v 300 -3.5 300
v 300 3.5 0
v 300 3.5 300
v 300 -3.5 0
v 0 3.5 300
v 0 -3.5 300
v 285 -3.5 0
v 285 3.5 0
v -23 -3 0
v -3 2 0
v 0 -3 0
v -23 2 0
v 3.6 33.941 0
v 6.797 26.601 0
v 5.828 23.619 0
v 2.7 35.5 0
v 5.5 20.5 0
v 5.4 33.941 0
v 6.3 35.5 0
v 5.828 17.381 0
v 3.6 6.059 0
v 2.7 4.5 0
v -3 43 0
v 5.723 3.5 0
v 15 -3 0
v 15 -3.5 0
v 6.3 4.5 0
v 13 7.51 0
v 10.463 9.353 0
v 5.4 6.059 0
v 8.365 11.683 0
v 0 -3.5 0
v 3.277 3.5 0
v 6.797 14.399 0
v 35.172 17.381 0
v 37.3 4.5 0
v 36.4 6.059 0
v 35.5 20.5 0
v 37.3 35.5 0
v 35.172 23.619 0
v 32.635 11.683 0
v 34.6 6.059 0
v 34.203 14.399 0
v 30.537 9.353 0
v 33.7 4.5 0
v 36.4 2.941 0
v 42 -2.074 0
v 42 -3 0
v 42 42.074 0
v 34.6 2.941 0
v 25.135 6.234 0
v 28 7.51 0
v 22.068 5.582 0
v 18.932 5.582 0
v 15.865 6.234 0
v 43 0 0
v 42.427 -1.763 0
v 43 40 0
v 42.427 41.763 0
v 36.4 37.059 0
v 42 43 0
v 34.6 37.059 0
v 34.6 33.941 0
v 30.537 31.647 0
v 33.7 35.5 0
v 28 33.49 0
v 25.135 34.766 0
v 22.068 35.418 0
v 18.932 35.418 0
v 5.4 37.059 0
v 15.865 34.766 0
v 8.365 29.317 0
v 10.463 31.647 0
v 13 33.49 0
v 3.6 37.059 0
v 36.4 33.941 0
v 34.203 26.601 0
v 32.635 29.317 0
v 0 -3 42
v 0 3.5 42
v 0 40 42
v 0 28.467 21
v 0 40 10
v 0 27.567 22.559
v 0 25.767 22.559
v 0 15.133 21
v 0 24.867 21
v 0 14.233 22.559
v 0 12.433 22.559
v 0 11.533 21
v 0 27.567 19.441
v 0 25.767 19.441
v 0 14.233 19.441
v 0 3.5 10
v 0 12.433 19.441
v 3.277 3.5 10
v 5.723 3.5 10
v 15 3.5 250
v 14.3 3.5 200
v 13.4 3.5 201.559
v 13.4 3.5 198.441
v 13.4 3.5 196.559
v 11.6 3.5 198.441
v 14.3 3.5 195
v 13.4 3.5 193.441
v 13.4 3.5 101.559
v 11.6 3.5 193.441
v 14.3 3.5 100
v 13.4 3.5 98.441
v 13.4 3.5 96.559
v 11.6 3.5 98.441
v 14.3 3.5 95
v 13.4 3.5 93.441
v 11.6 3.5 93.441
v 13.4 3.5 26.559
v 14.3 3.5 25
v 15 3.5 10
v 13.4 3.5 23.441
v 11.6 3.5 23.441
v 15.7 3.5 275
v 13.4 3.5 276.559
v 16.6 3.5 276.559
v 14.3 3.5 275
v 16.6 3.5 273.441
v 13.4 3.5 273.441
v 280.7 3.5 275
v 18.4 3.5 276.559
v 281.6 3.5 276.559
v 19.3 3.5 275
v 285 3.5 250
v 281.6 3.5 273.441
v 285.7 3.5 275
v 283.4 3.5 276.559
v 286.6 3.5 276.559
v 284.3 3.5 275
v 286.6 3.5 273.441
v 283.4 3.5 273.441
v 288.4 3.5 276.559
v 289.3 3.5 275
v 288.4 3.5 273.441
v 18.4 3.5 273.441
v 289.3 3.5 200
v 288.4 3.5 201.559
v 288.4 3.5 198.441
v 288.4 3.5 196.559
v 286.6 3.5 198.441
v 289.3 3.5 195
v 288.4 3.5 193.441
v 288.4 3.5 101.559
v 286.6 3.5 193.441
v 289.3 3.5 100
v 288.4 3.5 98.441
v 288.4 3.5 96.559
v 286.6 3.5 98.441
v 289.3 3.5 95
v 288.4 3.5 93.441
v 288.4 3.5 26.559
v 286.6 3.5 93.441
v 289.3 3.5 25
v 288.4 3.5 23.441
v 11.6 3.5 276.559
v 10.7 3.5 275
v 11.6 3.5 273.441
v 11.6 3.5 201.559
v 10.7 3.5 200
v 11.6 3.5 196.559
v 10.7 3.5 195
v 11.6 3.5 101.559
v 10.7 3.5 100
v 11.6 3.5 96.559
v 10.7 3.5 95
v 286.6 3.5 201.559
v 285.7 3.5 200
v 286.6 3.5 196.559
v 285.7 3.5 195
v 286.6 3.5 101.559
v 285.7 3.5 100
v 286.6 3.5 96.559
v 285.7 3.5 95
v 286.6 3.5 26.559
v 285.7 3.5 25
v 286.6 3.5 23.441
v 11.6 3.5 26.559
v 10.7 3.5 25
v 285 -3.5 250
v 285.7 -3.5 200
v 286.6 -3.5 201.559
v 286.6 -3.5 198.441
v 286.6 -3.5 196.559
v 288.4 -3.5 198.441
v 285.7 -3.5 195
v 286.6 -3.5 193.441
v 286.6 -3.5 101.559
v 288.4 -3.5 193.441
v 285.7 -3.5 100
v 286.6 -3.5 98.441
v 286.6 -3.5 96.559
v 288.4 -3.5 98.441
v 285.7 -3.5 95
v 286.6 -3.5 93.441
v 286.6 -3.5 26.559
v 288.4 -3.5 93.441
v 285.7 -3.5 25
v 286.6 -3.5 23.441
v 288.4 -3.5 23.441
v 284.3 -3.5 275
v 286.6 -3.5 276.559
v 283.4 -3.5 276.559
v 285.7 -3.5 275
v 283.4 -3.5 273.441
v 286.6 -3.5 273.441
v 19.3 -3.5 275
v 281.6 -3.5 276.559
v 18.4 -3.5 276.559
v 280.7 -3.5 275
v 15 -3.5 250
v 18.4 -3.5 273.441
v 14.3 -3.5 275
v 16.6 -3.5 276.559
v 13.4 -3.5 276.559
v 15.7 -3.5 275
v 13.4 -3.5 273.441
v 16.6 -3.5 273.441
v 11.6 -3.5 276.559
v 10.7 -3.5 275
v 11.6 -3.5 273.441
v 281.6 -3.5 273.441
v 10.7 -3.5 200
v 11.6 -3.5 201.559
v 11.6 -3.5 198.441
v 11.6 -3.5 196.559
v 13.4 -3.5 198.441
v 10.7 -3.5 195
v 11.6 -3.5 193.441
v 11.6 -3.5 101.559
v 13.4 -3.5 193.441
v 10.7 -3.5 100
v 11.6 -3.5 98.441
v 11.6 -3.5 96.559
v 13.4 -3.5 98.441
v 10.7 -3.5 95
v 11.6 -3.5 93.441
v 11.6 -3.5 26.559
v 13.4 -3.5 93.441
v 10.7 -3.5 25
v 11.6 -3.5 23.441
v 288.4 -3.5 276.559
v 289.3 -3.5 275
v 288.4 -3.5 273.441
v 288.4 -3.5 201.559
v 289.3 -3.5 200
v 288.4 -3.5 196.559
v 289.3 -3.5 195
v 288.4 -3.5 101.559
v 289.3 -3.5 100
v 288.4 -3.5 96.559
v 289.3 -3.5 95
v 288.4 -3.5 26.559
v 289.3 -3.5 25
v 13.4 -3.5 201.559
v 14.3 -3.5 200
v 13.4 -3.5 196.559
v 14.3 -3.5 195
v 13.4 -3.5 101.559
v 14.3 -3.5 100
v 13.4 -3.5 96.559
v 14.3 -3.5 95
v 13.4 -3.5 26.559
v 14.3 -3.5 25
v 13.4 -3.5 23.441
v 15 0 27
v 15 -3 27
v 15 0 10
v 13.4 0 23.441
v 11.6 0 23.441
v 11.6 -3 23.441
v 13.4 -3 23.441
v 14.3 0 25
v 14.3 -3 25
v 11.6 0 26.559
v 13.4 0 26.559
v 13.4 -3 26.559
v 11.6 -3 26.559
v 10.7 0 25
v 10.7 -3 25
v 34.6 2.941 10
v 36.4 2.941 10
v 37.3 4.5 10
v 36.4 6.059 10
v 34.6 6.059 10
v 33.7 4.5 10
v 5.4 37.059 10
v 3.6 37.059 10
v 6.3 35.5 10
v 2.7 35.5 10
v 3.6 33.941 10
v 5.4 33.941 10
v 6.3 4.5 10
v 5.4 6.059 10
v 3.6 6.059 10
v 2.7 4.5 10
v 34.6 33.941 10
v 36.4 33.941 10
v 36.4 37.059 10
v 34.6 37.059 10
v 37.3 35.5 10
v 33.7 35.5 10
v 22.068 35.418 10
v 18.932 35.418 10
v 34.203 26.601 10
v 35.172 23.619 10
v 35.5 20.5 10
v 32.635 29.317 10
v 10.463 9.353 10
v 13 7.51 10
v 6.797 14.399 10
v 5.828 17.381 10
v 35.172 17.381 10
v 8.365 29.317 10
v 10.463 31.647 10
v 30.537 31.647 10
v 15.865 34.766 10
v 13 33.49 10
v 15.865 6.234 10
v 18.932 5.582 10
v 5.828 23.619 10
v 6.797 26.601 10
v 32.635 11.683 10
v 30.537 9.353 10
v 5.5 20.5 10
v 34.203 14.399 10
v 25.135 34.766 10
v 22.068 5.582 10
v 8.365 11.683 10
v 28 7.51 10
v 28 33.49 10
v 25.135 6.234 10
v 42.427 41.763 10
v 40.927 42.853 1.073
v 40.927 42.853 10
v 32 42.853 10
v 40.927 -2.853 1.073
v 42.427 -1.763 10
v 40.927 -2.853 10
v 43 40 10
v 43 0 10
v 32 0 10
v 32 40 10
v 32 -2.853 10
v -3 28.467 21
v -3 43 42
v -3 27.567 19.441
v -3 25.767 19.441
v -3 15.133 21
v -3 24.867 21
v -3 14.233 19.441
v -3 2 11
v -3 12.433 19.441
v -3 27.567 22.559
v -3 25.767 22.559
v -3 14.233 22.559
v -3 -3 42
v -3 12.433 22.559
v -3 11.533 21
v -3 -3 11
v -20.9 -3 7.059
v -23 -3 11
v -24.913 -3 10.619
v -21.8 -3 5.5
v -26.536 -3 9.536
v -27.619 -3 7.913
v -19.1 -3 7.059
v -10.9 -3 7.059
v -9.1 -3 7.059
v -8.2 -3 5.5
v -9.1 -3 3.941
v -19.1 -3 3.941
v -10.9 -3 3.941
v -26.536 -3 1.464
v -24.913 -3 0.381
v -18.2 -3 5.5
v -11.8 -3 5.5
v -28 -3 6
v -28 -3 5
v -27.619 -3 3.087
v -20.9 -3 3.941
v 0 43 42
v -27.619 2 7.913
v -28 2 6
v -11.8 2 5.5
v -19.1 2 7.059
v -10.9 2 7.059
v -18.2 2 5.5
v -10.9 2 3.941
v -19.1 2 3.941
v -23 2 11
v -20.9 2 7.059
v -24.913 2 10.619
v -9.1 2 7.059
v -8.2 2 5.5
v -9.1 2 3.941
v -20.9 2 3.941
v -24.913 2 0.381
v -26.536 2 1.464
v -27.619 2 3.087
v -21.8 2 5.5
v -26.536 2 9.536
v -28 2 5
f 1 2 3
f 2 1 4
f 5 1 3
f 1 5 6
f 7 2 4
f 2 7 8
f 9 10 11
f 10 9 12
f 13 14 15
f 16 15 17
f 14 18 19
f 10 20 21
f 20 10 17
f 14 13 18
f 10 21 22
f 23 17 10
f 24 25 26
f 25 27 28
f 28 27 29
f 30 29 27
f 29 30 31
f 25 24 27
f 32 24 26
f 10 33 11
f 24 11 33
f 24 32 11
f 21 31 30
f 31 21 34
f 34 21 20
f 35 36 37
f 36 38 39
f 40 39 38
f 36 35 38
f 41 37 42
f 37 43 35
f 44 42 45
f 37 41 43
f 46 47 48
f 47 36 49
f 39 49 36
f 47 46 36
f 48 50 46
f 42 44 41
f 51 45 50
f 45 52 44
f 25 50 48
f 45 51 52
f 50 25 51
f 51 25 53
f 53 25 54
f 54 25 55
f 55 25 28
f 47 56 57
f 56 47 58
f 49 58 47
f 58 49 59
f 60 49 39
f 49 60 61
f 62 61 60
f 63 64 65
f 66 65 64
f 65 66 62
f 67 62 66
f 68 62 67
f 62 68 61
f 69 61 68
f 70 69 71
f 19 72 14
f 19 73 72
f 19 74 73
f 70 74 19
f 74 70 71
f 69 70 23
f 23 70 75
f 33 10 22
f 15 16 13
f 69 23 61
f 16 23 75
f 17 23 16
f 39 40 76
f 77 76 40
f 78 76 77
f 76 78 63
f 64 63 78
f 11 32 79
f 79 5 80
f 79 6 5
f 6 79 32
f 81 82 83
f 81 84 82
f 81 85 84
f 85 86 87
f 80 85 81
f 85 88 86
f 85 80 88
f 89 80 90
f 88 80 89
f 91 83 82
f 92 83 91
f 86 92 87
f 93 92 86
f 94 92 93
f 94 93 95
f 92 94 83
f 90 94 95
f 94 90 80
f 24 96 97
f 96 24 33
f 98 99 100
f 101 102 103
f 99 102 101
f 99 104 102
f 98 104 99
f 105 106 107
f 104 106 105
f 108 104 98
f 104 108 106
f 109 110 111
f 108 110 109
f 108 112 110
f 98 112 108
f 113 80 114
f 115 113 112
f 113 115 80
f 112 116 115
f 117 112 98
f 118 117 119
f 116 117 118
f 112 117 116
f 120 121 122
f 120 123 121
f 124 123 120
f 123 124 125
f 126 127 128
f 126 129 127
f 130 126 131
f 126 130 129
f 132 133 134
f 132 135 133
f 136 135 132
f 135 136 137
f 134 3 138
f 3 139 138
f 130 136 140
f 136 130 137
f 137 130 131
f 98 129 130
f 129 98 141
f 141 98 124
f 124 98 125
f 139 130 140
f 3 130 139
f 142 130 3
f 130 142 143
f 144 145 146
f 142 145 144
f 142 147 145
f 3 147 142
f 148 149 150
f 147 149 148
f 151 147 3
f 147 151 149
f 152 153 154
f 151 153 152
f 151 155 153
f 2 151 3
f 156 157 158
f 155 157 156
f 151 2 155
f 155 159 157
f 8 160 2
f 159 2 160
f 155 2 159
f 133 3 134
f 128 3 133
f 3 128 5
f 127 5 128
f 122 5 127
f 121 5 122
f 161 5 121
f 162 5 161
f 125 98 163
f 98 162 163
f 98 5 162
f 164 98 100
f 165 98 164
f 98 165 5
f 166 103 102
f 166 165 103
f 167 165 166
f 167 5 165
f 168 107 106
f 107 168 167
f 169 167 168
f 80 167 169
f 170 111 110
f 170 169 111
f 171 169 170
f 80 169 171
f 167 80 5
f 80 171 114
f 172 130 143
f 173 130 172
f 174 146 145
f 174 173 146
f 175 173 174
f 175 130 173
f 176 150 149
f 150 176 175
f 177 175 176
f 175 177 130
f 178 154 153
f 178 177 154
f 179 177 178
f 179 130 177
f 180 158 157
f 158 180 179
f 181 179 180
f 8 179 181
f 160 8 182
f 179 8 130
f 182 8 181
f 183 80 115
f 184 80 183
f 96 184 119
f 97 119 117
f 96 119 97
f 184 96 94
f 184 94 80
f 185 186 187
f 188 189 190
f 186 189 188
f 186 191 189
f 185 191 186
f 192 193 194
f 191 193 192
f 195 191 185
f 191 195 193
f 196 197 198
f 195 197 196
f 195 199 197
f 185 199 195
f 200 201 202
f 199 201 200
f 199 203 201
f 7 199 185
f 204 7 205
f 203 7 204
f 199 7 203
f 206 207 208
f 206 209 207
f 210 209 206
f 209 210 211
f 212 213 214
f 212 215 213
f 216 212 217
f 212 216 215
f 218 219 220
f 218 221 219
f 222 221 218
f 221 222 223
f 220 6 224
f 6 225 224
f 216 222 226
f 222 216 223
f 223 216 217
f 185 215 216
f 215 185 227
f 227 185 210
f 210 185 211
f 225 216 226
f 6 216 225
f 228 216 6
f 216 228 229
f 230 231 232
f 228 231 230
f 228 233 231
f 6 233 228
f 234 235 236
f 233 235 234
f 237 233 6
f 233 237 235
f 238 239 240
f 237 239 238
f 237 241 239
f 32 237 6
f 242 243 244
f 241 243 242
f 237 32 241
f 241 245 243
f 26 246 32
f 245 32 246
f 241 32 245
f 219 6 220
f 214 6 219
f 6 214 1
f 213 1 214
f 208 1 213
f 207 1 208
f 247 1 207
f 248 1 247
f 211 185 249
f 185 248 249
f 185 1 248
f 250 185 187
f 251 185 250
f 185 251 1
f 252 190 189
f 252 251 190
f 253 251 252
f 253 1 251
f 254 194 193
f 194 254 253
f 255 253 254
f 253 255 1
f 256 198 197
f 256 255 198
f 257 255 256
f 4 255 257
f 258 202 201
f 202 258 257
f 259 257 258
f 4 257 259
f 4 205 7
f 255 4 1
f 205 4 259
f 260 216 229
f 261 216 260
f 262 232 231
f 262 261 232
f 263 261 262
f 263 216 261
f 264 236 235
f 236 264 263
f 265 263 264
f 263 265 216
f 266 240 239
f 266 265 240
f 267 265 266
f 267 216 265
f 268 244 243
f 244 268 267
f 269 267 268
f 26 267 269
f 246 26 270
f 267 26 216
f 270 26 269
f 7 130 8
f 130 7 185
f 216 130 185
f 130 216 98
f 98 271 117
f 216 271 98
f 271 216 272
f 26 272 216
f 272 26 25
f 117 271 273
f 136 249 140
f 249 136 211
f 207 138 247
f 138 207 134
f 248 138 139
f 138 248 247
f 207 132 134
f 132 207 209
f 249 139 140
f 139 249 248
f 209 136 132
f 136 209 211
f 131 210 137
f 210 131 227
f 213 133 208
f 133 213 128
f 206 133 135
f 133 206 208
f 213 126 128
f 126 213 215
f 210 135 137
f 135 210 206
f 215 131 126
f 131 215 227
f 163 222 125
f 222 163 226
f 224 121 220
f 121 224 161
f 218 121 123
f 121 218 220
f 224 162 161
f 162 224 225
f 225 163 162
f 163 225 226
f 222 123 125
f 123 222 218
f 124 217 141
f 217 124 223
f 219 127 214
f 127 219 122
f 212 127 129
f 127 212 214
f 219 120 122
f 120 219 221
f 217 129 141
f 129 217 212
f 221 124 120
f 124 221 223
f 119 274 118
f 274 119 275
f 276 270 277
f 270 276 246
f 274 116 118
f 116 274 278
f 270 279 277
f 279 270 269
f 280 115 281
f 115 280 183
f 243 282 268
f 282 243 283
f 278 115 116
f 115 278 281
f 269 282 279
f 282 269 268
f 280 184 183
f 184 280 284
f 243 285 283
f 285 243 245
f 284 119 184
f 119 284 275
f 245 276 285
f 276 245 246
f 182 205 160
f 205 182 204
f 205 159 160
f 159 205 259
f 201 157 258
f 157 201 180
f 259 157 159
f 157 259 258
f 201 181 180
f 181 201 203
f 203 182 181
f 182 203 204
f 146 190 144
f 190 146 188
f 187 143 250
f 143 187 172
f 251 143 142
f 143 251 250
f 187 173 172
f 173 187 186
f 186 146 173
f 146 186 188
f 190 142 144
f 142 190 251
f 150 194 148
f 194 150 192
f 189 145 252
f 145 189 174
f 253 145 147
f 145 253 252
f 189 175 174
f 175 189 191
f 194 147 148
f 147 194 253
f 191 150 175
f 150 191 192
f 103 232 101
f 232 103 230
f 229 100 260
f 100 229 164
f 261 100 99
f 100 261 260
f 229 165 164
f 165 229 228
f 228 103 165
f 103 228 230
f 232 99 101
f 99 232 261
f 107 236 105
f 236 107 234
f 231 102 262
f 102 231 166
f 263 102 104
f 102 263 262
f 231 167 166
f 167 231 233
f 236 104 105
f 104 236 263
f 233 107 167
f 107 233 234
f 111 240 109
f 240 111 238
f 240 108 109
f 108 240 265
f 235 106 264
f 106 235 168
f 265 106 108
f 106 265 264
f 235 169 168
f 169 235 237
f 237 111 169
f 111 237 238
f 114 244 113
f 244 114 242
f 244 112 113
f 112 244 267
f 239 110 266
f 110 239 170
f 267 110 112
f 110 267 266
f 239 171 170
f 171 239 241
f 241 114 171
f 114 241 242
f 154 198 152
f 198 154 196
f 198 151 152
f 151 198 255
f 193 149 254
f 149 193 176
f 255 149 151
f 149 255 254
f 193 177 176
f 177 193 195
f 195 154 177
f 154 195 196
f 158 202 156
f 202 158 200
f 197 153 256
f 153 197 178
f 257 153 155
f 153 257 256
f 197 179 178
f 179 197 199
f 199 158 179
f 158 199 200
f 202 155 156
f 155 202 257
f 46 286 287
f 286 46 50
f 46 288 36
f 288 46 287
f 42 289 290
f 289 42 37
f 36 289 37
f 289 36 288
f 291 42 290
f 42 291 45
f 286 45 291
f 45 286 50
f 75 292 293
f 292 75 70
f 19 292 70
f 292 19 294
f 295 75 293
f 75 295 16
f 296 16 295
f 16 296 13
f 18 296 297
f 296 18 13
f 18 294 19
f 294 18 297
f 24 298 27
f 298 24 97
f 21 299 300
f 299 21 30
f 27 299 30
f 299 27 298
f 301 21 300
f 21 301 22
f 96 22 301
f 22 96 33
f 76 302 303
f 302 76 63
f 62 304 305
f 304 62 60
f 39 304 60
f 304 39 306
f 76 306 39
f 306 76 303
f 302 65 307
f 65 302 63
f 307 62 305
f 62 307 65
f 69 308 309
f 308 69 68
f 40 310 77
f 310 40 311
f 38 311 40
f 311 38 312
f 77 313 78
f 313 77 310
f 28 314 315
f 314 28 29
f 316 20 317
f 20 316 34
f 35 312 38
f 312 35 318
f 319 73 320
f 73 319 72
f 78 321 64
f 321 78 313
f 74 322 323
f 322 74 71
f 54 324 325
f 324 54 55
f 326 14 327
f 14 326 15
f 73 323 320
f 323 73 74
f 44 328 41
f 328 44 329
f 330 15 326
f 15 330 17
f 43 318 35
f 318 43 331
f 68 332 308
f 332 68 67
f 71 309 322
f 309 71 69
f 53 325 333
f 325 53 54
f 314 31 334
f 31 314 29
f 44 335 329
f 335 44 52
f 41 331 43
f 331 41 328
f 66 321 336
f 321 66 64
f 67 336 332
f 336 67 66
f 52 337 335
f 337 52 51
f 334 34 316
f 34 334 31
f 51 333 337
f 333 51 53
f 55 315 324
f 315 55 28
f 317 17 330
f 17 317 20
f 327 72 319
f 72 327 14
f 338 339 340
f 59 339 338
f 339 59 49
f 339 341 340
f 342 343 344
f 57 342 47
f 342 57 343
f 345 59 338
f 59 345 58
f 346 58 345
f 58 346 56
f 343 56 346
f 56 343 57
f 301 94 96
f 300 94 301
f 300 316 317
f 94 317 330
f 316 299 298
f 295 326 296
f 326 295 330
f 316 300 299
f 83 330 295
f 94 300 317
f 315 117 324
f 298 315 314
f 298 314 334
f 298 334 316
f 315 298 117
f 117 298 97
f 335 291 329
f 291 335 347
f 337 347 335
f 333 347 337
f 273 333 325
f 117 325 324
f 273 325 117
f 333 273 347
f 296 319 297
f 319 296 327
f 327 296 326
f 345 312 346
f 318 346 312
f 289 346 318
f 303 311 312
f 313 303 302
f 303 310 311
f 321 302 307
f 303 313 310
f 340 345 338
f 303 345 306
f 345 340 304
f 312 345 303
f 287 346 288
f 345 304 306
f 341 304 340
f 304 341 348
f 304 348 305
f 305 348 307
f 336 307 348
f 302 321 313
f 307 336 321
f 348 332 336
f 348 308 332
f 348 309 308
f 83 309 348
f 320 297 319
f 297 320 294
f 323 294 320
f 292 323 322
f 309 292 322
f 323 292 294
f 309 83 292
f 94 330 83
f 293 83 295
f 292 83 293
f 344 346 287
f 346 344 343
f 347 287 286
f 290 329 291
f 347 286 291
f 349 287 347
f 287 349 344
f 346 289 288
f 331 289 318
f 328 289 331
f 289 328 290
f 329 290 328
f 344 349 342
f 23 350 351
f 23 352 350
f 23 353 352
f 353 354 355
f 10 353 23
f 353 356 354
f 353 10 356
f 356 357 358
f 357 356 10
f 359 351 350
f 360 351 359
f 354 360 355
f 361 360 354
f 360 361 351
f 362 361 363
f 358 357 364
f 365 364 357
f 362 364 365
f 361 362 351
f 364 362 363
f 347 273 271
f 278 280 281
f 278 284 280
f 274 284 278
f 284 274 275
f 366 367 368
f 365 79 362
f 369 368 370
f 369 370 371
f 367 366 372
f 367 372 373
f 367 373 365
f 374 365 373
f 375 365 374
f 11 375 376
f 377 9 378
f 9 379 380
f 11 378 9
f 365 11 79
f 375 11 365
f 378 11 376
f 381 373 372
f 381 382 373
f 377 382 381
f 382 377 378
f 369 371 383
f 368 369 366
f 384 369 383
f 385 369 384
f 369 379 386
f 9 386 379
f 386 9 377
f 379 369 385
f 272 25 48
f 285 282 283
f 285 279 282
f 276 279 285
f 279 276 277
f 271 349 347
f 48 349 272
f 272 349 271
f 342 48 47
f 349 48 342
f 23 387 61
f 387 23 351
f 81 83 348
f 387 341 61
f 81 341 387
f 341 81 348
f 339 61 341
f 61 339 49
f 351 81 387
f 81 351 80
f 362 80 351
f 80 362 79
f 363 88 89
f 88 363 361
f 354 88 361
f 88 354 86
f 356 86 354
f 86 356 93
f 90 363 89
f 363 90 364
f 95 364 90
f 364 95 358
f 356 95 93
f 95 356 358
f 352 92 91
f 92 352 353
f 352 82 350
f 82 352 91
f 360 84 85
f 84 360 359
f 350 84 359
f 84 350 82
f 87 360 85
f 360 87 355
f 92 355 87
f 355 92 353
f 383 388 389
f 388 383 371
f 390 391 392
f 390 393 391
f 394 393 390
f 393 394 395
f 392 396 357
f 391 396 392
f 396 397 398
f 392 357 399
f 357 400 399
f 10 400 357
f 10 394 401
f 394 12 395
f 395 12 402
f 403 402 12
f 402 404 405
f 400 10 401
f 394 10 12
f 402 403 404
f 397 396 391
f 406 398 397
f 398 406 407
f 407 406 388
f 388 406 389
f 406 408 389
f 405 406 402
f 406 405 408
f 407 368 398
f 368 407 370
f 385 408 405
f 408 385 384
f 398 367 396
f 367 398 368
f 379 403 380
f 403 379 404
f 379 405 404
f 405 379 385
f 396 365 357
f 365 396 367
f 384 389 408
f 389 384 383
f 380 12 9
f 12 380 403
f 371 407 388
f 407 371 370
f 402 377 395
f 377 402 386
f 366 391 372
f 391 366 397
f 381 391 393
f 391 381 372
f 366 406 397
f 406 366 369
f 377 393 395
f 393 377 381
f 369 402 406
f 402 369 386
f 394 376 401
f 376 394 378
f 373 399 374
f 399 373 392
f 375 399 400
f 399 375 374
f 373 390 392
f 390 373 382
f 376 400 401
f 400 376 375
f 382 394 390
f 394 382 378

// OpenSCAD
// file: YmotorMount.scad
screwdistnema17=31;
xymot=40;
M3=1.8;
module topplate() {minkowski()
{
 cube([xymot,xymot,5]);
 cylinder(r=3,h=5);
}
}
//the holeplate module defines the motor bracket 
module holeplate(){
difference(){
	topplate();
	translate([(xymot-screwdistnema17)/2,(xymot-screwdistnema17)/2,-10]){
		translate([screwdistnema17,0,0])cylinder(r=M3,h=150);
		translate([0,screwdistnema17,0])cylinder(r=M3,h=150);
		cylinder(r=M3,h=150);
		translate([screwdistnema17,screwdistnema17,0])cylinder(r=M3, h=150);
		translate([xymot/2.5, xymot/2.5, 0])cylinder(r=15, h=150);
	}
}
}
//this function joins the four elements of the motormount
module braceplate(){
difference(){
	union() {
		holeplate();
		translate([0,-3,0])rotate([0,0,0])triangle(3,42);
		translate([0,xymot,0])triangle(3,42);
		translate([-3,-3,0])rotate([90,0,90])cube([46,42,3]);
}
	translate([-10,xymot/3,21])rotate([90,0,90])cylinder(r=M3, h=150);
	translate([-10,xymot/1.5,21])rotate([90,0,90])cylinder(r=M3, h=150);
}
}
//this module generates the triangular side brace
module triangle(thickness,h){
	difference(){
		cube([h, thickness, h]);
		translate([0,-5,h])rotate([0,45,0])cube([h*2,thickness+10,h]);
	}
}
module braceplatearm(){
union(){
	braceplate();
	translate([-23,2,5])rotate([90,0,0])minkowski()
{
	cube([20,1,2]);
	cylinder(r=5,h=3);
}
}
}
difference(){
	braceplatearm();
	rotate([90,0,0])translate([-xymot/2,5.5,-10])cylinder(r=M3,h=100);
	rotate([90,0,0])translate([-xymot/4,5.5,-10])cylinder(r=M3,h=100);
}




	
// file: support brace.scad
wholex=300;
wholey=300;
wholez=300;
screwdistnema17=31;
xysmoothr=4;
zsmoothr=5;
zleadr=2.5;
basey=wholey*.75;
thickness= 7;
M3=1.8;

//the center point for each bracket is at a one-third and two-thirds the lenght of each respective edge of the brace
zbracket1=wholez*.33;
zbracket2=wholez*.66;

ybracket1=basey*.33;
ybracket2=basey*.66;

//this is the distance of the screw-holes from any edge of the brace
bracketins=15;


sidebracket ();

translate([wholex-thickness,0,0])
sidebracket ();



module sidebracket()	{
//this is the support-brace, extending behind the printer
difference()	{
translate([0,basey,0]);
cube([thickness,basey,wholez]);

//the next four holes are for screws in the vertical brackets, 25mm into the brace, screws spaced 10mm apart within each bracket
translate([-thickness,bracketins,zbracket1-5])
rotate([0,90,0])
cylinder(thickness*5,M3,M3);

translate([-thickness,bracketins,zbracket1+5])
rotate([0,90,0])
cylinder(thickness*5,M3,M3);

translate([-thickness,bracketins,zbracket2-5])
rotate([0,90,0])
cylinder(thickness*5,M3,M3);

translate([-thickness,bracketins,zbracket2+5])
rotate([0,90,0])
cylinder(thickness*5,M3,M3);


//the next four holes are for screws in the horizontal brackets, 25mm into the brace, screws spaced 10mm apart within each bracket
translate([-thickness,ybracket1-5,bracketins])
rotate([0,90,0])
cylinder(thickness*5,M3,M3);

translate([-thickness,ybracket1+5,bracketins])
rotate([0,90,0])
cylinder(thickness*5,M3,M3);

translate([-thickness,ybracket2-5,bracketins])
rotate([0,90,0])
cylinder(thickness*5,M3,M3);

translate([-thickness,ybracket2+5,bracketins])
rotate([0,90,0])
cylinder(thickness*5,M3,M3);


//these are the screw holes for the motor
translate([-thickness,bracketins,bracketins+5])
rotate([0,90,0])
cylinder(thickness*5,M3,M3);

translate([-thickness,bracketins,bracketins+15])
rotate([0,90,0])
cylinder(thickness*5,M3,M3);


//this is the angle to be cut away from the brace, to make a sexy slant
translate([0,basey,0])
rotate([22.5,0,0])	
translate([-thickness/2,0,-50])	
cube([thickness*2,wholey/2,wholez+100]);

}
}
// file: frontplate.scad
//EVERYBODY ELSE IS USING THESE SAME VARIABLES SO USE THEM AND DO NOT CHANGE ANYTHING UNLESS THERE'S A GOOD FUCKING REASON
wholex=300;
wholey=300;
wholez=300;
thickness=7;
xysmoothr=4;
zsmoothr=5;
zleadr=2.5;
m3=1.8;
res=20;



//thickness of sides which motors and smoothrods mount to
sidethickness=30;
//thickness of top part, should not be the limiting factor of build height, smooth rod height, and smooth rod point of attachment will be.
topthickness=50;


translate([wholex/2,0,wholez/2])frontplate();


//These are the variables describing the cube which is subtracted from the larger front plate.
//s=size
sx=wholex-sidethickness;
sy=thickness+1;
sz=wholez-topthickness;

//These are the coordinates of the cylinders which represent the screwholes for the smooth rods and the motor mount. "cyl" is short for cylinder. 
cylx=137.5*wholex/300;
cyly=125*wholey/300;
cylz=125*wholez/300;

//Each pair of screwholes is separated by 5mm along the x-axis. Keep in mind that you might have to space the top and bottom screwholes differently in the final product, which would require that you create a different variable.
separation=5;

//Here are the z-coordinates of some more cylinders. Be ready to create another variable for their height or separation in the final product.
cilz=50*wholez/300;

//This is the front plate, aka the xz plate.

module frontplate(){
difference(){
cube(size=[wholex,thickness,wholez],center=true);

//Everything below this is the subtracted part.
#translate([0,0,-(wholez-sz)/2])cube([sx,sy,sz],center=true);

//These cylinders represent the screwholes holding the smooth rods in place.

#translate([cylx,cyly,cylz])rotate([90,0,0])cylinder(h=wholey,r=m3);
#translate([cylx-separation,cyly,cylz])rotate([90,0,0])cylinder(h=wholey,r=m3);
#translate([-cylx,cyly,cylz])rotate([90,0,0])cylinder(h=wholey,r=m3);
#translate([separation-cylx,cyly,cylz])rotate([90,0,0])cylinder(h=wholey,r=m3);

//These represent the screwholes that connect to the motor mount.
#translate([-cylx,cyly,-cylz])rotate([90,0,0])cylinder(h=wholey,r=m3);
#translate([separation-cylx,cyly,-cylz])rotate([90,0,0])cylinder(h=wholey,r=m3);
#translate([cylx,cyly,-cylz])rotate([90,0,0])cylinder(h=wholey,r=m3);
#translate([cylx-separation,cyly,-cylz])rotate([90,0,0])cylinder(h=wholey,r=m3);

//holes for bracket interface to attach right and left brace to front plate
#translate([cylx,cyly,cilz])rotate([90,0,0])cylinder(h=wholey,r=m3);
#translate([cylx,cyly,cilz-separation])rotate([90,0,0])cylinder(h=wholey,r=m3);
#translate([-cylx,cyly,cilz])rotate([90,0,0])cylinder(h=wholey,r=m3);
#translate([-cylx,cyly,cilz-separation])rotate([90,0,0])cylinder(h=wholey,r=m3);
#translate([-cylx,cyly,-cilz])rotate([90,0,0])cylinder(h=wholey,r=m3);
#translate([-cylx,cyly,-cilz-separation])rotate([90,0,0])cylinder(h=wholey,r=m3);
#translate([cylx,cyly,-cilz])rotate([90,0,0])cylinder(h=wholey,r=m3);
#translate([cylx,cyly,-cilz-separation])rotate([90,0,0])cylinder(h=wholey,r=m3);
}
}
// main file
include<frontplate.scad>
include<support brace.scad>
include<YmotorMount.scad>



wholex=300;
